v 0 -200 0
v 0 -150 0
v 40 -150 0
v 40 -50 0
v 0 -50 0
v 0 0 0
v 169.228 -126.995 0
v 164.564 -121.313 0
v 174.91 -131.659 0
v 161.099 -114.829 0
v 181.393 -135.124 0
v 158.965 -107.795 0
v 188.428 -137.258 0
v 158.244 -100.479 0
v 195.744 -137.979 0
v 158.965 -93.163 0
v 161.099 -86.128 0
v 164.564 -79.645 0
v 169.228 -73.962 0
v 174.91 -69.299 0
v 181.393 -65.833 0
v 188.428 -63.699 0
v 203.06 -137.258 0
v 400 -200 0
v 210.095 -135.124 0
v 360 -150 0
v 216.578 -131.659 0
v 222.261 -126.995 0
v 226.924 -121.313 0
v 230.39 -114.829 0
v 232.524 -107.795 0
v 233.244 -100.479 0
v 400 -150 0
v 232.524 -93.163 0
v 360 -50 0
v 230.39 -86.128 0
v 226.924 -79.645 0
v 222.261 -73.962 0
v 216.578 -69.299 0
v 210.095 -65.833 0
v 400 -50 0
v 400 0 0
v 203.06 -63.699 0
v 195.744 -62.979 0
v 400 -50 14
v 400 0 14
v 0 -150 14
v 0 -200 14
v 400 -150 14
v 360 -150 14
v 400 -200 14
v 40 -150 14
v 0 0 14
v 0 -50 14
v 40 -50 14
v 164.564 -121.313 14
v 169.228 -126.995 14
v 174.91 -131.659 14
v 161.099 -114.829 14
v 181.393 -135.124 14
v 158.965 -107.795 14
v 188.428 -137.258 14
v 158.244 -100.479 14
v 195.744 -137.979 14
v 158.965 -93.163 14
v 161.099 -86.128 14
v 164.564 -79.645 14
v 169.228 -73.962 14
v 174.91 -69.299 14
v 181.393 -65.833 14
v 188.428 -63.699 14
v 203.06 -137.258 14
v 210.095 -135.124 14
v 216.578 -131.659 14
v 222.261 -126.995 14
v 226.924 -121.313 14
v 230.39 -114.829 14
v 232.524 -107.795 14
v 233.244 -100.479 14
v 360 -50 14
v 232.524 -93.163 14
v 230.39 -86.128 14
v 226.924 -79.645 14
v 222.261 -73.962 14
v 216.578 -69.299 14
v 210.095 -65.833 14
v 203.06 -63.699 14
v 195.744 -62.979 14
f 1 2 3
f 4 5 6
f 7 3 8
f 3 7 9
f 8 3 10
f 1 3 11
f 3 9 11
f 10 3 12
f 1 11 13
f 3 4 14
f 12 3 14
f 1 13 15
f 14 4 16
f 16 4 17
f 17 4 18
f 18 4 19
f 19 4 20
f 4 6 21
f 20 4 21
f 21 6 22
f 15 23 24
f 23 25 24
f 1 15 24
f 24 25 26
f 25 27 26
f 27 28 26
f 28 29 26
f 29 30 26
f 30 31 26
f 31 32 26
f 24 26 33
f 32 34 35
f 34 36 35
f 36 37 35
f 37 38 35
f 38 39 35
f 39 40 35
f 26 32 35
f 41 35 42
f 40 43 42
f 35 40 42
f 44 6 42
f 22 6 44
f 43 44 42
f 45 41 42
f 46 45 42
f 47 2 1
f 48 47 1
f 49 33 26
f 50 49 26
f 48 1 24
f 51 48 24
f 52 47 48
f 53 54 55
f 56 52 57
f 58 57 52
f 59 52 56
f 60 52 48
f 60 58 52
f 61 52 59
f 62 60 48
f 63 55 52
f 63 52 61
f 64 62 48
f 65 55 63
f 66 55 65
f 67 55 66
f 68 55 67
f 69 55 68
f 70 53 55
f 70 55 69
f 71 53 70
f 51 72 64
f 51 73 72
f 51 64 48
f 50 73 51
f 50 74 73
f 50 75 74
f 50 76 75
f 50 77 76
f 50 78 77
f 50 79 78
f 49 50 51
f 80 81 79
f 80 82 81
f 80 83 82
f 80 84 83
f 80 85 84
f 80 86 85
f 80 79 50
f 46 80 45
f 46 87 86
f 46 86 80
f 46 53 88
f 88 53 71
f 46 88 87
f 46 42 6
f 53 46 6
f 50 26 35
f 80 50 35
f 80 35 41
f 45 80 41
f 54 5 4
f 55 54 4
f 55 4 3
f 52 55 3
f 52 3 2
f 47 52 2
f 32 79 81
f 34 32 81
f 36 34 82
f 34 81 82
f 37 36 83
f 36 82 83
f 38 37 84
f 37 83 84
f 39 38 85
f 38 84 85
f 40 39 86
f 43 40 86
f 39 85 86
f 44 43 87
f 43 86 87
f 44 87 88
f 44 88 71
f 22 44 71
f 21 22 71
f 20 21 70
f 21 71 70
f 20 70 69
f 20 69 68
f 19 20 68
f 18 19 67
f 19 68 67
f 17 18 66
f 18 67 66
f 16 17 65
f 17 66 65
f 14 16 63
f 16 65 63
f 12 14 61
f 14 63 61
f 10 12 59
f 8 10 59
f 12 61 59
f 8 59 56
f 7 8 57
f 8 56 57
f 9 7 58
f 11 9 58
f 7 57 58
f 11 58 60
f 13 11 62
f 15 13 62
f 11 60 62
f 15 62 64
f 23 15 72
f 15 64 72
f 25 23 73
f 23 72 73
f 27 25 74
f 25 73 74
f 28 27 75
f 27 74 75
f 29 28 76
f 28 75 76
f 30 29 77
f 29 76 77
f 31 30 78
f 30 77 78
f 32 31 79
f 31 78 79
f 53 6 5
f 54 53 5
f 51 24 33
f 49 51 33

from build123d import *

# Parameters (mm, degrees)
F1_DEPTH = 14
F2_R     = 37.5
F3_DEPTH = 14


with BuildPart() as f1:
    # F0 (on Top) → F1 (new body)
    with BuildSketch(Plane.XY):
        Polygon((400, 0), (0, 0), (0, -50), (40, -50), (40, -150), (0, -150), (0, -200), (400, -200), (400, -150), (360, -150), (360, -50), (400, -50), align=None)
    extrude(amount=F1_DEPTH)

    # F2 (on face) → F3 (cut)
    with BuildSketch(Plane.XY.offset(14)):
        with Locations((195.744067, -100.478627)):
            Circle(F2_R)
    extrude(amount=-F3_DEPTH, mode=Mode.SUBTRACT)


solid = f1.part
